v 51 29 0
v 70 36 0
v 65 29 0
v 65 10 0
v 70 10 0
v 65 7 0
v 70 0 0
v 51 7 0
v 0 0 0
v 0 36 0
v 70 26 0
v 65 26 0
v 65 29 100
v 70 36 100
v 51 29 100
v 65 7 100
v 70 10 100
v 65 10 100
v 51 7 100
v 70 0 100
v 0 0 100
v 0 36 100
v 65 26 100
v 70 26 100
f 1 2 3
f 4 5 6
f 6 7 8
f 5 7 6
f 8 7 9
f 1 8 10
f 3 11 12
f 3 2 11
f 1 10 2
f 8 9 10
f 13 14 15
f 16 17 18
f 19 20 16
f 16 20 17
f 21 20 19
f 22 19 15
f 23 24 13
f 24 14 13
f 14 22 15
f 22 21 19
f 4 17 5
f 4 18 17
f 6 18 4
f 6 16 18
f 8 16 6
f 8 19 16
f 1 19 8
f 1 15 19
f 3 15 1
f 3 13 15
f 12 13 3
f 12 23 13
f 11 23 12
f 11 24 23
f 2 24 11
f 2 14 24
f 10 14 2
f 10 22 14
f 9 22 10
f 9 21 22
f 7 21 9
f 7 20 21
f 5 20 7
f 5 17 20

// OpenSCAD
$fn = 32;

// ----------------------------------------------------------------------
// T-slot rail: 70 x 36 mm section, 100 mm long
// ----------------------------------------------------------------------

// --- parameters (mm) ---
profile_height = 100;     // extrusion height
profile_points = 12;      // points of the closed outline

profile = [[0, 0], [70, 0], [70, 10], [65, 10], [65, 7], [51, 7], [51, 29], [65, 29], [65, 26], [70, 26], [70, 36], [0, 36]];  // single closed polygon, 12 points, counter clockwise

// --- the one profile operation ---
linear_extrude(height = profile_height) polygon(points = profile);
